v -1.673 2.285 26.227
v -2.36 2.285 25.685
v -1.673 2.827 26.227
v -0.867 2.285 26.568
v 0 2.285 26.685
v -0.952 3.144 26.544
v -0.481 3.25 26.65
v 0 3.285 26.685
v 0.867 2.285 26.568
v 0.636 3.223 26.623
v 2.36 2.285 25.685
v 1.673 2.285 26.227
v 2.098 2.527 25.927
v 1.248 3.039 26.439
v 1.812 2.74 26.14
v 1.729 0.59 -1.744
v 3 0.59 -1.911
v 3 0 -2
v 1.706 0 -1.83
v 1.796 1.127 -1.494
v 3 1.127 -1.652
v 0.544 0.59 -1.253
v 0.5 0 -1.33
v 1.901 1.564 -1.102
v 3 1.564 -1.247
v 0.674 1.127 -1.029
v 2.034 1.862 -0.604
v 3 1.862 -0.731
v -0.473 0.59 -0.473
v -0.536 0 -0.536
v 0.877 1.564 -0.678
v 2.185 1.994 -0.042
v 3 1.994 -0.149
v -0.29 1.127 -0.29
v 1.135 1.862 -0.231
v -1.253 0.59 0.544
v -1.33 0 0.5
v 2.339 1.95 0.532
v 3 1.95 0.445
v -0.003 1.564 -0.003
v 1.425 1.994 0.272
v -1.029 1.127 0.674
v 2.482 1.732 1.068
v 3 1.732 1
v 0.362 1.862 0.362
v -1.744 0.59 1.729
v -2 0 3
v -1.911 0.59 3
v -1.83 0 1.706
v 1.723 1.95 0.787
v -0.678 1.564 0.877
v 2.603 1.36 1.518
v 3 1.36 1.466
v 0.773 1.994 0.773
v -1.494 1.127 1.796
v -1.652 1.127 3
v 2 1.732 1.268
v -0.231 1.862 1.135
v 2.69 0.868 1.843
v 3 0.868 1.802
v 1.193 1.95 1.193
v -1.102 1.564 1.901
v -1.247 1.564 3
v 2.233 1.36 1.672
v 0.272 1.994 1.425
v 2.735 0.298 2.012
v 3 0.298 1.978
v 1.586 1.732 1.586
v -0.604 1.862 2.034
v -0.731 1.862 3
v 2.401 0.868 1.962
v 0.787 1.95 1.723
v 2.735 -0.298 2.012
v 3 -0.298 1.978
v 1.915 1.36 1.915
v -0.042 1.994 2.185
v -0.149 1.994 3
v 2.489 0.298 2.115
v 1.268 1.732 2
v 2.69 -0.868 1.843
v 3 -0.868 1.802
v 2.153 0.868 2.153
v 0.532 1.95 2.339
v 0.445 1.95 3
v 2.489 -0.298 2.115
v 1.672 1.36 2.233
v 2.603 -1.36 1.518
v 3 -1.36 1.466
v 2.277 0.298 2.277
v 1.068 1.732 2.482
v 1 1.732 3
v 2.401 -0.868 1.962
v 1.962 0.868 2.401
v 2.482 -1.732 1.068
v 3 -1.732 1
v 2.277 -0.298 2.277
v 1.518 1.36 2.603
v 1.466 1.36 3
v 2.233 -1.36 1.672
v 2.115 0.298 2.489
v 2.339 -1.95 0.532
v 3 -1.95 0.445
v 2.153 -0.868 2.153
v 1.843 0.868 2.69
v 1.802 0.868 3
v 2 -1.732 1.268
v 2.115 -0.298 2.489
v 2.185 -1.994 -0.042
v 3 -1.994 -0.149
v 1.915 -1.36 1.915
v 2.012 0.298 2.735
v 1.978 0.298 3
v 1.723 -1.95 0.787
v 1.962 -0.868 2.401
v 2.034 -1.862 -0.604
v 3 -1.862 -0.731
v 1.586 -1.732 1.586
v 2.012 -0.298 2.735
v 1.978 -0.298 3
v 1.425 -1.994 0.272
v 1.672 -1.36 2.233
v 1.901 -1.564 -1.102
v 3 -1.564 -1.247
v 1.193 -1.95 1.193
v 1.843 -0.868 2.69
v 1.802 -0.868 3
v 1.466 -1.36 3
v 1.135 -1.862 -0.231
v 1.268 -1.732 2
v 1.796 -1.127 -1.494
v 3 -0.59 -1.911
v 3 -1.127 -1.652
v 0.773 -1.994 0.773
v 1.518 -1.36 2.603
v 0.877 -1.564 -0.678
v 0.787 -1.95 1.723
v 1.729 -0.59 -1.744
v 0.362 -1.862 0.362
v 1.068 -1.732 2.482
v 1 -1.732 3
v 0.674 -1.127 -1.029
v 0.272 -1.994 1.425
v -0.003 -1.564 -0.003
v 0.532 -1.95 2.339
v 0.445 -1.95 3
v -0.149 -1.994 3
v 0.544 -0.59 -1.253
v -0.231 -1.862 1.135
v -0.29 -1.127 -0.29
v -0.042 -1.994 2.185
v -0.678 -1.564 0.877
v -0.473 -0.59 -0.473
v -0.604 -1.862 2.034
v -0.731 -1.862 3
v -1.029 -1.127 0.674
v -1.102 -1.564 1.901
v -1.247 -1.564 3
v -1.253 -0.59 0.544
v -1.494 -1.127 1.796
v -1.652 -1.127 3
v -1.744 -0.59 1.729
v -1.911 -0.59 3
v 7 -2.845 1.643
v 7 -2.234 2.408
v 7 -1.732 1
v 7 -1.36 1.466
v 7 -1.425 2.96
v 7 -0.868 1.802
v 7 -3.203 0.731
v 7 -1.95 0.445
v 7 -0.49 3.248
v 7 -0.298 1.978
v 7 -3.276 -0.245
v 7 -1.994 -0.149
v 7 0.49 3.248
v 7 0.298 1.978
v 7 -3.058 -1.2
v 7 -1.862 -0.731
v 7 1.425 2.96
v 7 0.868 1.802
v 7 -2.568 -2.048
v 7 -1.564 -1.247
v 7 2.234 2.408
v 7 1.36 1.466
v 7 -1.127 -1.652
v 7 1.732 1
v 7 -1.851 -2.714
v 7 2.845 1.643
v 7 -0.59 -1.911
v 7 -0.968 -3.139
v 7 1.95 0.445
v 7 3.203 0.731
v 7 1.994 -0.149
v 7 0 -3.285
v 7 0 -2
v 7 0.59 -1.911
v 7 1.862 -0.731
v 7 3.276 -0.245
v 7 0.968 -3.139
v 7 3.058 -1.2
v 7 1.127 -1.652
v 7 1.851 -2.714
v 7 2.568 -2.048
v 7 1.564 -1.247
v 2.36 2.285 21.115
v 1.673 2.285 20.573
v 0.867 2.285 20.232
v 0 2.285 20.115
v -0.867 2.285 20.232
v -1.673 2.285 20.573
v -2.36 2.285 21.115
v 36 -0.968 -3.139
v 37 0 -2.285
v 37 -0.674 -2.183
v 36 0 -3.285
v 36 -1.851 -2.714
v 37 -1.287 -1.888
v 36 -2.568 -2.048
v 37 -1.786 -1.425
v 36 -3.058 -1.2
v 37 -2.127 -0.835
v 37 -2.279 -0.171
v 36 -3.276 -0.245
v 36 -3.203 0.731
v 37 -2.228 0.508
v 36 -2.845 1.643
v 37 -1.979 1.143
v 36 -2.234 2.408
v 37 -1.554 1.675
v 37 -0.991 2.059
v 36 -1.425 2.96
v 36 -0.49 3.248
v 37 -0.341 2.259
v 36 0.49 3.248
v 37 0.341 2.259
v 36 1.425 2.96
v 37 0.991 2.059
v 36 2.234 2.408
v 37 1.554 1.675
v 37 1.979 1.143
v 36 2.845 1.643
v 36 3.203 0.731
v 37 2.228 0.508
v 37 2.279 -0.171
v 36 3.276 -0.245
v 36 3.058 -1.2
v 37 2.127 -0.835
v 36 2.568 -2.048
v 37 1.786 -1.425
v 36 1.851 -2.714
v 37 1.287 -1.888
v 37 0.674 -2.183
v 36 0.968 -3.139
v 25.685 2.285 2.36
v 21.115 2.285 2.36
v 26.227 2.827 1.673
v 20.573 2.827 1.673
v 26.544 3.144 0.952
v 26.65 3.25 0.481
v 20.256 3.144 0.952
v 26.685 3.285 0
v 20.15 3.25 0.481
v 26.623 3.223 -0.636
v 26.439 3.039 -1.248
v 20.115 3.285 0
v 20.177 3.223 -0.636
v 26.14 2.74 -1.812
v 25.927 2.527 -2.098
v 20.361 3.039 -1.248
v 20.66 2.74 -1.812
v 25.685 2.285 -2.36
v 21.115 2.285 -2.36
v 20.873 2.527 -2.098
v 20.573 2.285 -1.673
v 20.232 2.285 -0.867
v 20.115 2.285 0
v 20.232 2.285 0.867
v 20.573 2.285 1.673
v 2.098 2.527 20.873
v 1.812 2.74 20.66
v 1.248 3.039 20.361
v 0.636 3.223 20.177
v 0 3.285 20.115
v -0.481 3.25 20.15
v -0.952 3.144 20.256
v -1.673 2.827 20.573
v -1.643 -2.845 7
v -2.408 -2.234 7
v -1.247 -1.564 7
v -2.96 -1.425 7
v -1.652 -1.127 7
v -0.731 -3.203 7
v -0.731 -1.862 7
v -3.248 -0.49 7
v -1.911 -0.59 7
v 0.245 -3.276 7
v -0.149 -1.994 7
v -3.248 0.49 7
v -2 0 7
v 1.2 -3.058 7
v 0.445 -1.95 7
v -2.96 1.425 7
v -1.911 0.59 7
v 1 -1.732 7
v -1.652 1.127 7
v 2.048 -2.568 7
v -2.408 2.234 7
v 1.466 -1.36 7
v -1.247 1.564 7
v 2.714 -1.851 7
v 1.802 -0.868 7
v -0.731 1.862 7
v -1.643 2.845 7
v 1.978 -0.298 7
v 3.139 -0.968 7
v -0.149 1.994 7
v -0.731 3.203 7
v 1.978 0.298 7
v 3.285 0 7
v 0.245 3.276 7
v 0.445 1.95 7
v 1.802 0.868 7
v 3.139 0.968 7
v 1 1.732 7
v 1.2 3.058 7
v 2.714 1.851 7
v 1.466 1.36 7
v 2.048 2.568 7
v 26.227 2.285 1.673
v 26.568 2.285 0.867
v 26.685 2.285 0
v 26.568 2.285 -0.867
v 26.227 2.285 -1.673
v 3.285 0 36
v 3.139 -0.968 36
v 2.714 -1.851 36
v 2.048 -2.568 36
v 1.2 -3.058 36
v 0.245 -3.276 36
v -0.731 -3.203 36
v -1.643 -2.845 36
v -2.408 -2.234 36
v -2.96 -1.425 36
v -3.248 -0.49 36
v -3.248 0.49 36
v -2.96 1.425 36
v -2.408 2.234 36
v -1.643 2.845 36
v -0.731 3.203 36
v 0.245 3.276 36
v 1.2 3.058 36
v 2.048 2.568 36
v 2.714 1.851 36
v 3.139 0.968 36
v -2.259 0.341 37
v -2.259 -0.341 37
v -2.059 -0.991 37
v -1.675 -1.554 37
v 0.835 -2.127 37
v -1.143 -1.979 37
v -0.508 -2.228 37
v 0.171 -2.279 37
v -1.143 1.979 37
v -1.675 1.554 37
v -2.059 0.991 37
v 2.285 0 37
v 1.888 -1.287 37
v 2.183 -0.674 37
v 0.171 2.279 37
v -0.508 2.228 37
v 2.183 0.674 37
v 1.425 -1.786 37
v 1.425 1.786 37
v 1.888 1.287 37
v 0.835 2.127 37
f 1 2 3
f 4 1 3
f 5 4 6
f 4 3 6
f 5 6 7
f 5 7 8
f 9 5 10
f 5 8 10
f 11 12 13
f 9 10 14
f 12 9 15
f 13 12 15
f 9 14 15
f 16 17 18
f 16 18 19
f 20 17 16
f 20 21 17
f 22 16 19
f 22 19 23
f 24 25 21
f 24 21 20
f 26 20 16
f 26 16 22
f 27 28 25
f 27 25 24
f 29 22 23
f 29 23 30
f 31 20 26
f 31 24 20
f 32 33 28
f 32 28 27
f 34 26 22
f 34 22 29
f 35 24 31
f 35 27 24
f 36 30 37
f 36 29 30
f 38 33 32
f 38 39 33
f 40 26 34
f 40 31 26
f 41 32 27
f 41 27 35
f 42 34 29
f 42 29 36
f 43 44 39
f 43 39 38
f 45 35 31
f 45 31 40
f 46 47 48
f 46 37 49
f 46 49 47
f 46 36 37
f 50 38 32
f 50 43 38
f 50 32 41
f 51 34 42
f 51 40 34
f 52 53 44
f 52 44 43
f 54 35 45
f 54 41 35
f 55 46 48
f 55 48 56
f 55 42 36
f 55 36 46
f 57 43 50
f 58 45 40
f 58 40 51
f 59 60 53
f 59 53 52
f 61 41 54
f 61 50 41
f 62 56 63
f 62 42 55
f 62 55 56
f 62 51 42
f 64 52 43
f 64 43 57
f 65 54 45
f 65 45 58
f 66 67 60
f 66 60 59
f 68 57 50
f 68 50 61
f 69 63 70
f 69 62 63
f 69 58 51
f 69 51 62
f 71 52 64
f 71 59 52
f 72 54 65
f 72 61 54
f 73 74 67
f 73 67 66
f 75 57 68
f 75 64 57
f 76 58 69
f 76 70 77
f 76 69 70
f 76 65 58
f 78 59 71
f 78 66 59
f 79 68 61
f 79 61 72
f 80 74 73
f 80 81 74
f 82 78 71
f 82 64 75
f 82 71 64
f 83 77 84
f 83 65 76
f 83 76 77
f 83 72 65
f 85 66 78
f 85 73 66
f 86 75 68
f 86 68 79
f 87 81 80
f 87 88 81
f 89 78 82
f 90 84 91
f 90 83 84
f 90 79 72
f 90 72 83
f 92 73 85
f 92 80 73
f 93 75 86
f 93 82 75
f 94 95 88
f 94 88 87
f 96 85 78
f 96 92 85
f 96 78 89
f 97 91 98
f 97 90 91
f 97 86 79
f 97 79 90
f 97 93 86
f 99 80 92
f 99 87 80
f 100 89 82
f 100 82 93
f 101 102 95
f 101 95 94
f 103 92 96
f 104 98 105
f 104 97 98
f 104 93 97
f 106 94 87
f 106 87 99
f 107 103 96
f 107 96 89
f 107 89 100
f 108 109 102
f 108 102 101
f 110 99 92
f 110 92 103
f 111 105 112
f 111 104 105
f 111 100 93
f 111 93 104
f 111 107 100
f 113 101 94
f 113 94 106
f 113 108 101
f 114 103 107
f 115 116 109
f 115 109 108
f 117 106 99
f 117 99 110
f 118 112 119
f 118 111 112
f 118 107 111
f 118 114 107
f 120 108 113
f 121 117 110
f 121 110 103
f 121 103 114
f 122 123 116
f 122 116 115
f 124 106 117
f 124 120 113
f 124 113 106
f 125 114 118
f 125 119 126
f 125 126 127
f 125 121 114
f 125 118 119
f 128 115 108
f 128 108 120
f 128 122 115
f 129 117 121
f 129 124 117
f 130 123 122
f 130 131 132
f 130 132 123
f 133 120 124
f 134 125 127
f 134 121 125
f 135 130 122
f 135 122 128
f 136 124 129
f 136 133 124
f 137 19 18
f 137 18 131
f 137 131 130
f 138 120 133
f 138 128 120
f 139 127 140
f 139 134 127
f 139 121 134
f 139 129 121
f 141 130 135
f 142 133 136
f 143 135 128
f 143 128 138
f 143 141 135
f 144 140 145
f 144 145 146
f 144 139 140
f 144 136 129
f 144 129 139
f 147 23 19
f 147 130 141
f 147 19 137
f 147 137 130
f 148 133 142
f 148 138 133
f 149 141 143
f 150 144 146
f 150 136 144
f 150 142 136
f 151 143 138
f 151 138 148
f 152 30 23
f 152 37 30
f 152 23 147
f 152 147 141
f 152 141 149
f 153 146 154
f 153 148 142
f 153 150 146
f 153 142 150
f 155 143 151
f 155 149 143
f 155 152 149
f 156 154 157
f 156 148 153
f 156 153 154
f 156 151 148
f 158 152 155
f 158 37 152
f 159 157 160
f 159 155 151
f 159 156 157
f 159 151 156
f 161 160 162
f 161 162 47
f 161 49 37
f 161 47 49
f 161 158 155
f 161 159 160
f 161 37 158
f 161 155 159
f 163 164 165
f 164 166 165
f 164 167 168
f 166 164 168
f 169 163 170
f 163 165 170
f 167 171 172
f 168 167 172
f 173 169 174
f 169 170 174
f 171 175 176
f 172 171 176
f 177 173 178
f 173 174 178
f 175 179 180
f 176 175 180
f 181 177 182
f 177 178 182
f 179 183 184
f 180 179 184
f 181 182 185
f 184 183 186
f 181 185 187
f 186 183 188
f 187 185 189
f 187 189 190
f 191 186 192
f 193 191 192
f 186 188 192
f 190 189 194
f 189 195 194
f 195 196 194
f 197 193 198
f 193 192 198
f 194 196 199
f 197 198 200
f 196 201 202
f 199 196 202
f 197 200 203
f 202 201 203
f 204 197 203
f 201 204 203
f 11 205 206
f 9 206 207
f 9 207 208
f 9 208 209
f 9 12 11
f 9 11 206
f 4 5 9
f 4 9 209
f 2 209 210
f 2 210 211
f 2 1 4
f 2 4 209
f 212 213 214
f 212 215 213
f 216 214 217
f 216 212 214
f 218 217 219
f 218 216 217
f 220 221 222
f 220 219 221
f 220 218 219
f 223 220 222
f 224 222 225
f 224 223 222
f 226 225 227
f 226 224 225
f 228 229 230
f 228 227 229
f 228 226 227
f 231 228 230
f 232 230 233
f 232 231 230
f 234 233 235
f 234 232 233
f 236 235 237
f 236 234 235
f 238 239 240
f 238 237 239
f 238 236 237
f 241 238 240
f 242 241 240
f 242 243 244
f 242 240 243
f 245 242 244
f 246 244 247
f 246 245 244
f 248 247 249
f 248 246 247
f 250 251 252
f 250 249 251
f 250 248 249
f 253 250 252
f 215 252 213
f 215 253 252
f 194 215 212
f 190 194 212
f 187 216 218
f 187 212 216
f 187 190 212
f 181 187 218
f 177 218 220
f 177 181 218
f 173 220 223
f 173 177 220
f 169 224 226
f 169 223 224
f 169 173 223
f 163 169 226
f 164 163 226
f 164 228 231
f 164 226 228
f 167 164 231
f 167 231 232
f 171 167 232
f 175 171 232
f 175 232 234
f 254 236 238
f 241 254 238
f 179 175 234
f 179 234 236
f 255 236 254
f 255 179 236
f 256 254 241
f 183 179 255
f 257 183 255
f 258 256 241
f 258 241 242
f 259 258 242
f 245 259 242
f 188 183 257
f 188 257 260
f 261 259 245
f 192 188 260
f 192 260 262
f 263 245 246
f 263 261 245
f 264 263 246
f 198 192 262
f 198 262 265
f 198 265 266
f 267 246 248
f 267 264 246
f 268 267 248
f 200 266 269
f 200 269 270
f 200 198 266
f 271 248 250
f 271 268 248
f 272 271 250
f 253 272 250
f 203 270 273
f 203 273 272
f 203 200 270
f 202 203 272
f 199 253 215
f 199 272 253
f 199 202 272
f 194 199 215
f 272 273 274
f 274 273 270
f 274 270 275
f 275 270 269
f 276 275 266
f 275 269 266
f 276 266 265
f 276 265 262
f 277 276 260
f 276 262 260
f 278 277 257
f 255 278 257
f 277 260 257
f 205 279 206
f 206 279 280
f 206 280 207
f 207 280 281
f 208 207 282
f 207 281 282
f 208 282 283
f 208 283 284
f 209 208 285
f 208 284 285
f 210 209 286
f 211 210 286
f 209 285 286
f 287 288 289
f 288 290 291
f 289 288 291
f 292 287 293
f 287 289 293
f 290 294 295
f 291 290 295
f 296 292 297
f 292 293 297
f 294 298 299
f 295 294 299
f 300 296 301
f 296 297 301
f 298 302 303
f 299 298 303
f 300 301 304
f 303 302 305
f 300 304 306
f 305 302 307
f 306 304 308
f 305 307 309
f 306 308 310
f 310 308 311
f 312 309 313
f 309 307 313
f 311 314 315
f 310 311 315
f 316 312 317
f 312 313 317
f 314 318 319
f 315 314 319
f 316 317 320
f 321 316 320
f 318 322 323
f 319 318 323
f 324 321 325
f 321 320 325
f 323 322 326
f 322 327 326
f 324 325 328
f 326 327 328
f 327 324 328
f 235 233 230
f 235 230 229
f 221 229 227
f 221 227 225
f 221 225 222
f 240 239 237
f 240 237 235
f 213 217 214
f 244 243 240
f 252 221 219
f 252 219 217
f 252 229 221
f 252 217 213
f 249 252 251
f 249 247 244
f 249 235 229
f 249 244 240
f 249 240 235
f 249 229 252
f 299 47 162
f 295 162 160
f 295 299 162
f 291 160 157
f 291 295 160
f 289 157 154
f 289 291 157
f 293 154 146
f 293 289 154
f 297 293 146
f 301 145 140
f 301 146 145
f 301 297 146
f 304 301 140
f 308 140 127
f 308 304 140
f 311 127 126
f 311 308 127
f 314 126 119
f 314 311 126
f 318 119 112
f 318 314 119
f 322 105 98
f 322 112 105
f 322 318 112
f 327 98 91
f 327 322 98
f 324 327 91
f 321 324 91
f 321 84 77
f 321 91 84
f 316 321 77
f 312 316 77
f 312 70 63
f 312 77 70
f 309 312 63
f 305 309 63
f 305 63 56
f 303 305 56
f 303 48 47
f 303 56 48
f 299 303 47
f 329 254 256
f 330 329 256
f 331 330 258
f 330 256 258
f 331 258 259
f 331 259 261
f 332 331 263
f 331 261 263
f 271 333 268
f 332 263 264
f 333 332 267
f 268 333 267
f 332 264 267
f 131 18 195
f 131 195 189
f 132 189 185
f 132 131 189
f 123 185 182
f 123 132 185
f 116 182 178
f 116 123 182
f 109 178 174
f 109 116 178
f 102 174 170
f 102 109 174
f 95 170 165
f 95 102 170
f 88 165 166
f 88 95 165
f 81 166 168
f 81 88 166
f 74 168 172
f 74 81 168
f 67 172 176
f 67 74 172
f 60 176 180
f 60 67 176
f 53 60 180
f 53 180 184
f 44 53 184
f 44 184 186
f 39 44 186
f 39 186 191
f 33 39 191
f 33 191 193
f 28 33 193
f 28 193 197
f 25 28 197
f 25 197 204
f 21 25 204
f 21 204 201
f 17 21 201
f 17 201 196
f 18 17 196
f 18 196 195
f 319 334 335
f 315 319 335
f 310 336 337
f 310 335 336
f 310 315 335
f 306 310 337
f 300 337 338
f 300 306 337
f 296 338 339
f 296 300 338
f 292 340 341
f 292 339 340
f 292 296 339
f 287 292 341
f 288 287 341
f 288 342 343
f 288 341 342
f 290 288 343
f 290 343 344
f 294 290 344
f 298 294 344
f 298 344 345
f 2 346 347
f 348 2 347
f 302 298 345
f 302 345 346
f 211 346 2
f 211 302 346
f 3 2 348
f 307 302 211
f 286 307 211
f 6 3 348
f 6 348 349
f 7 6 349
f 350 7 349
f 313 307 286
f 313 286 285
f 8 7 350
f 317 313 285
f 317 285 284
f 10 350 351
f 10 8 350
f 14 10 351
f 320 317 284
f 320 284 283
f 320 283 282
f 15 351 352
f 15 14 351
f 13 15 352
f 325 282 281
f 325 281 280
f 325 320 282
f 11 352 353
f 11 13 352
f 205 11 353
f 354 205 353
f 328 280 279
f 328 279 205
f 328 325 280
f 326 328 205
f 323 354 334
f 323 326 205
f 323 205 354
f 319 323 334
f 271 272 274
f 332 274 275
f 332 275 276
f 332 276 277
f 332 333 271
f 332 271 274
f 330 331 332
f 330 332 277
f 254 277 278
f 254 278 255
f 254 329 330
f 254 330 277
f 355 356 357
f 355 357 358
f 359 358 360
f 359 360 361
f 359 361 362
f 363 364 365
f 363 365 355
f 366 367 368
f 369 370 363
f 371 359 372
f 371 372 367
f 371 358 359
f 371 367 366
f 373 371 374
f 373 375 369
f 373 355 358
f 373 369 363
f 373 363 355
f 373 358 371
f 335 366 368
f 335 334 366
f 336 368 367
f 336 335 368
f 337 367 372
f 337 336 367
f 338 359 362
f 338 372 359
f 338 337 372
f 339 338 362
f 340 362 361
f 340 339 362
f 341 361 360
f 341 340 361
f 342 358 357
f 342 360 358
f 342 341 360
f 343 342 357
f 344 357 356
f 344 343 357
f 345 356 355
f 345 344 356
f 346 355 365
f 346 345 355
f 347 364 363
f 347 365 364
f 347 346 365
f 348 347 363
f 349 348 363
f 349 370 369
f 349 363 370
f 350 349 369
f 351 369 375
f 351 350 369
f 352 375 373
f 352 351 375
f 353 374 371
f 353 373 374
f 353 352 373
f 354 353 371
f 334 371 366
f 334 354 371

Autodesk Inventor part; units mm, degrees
ref_plane "YZ Plane" through (0, 0, 0) normal (1, 0, 0) x (0, 1, 0)
ref_plane "Work Plane1" through (0, 0, 7) normal (0, 0, 1) x (1, 0, 0)
sketch "Sketch1" plane through (0, 0, 7) normal (0, 0, 1) x (1, 0, 0)
  circle A0 centre (0, 0) radius 3.285
  dimension "d0" = 6.57
extrude "Extrusion1" add sketch "Sketch1" along normal blind 30
chamfer "Chamfer1" distance 1 angle 45 1 edges at (-3.285, 0, 37)
ref_plane "Work Plane2" through (0, 3.285, 7) normal (0, 1, 0) x (-1, 0, 0)
sketch "Sketch2" plane through (0, 3.285, 7) normal (0, 1, 0) x (-1, 0, 0)
  line L0 (3.285, 0) -> (3.285, 29) projected
  line L1 (-3.285, 0) -> (-3.285, 29) projected
  circle A0 centre (0, 16.4) radius 3.285
  point P0 (0, -7)
  dimension "d10" = 23.4
extrude "Extrusion2" cut sketch "Sketch2" against normal blind 1
pattern_circular "Circular Pattern1" count 2 over 90 about axis through (0, -10, 0) along (0, 1, 0) of "Extrusion1", "Chamfer1", "Extrusion2"
sketch "Sketch3" plane through (0, 0, 0) normal (0, 1, 0) x (-1, 0, 0)
  line L0 (-7, -3.285) -> (-7, 3.285) projected
  line L1 (-3.285, 7) -> (3.285, 7) projected
  line L2 (-7, 0) -> (-3, 0)
  line L3 (0, 3) -> (0, 7)
  arc A0 (-3, 0) -> (0, 3) centre (-3, 3) ccw
  dimension "d13" = 3
sketch "Sketch4" plane through (0, 0, 7) normal (0, 0, -1) x (-1, 0, 0)
  circle A0 centre (0, 0) radius 3.285 construction
  circle A1 centre (0, 0) radius 2
  dimension "d14" = 4
sweep "Sweep1" add profiles "Sketch4" path "Sketch3" path curves L3 A0 L2
equation "\"BendRadius\" = Thickness"
equation "\"BendReliefWidth\" = Thickness"
equation "\"BendReliefDepth\" = 0.5 * Thickness"
equation "\"CornerReliefSize\" = 4 * Thickness"
equation "\"MinimumRemnant\" = 2 * Thickness"
equation "\"TransitionRadius\" = BendRadius"
equation "\"JacobiRadiusSize\" = Thickness"
equation "\"GapSize\" = Thickness"
equation "\"Thickness\" = 3.048"
properties part number "20-128Z1"
